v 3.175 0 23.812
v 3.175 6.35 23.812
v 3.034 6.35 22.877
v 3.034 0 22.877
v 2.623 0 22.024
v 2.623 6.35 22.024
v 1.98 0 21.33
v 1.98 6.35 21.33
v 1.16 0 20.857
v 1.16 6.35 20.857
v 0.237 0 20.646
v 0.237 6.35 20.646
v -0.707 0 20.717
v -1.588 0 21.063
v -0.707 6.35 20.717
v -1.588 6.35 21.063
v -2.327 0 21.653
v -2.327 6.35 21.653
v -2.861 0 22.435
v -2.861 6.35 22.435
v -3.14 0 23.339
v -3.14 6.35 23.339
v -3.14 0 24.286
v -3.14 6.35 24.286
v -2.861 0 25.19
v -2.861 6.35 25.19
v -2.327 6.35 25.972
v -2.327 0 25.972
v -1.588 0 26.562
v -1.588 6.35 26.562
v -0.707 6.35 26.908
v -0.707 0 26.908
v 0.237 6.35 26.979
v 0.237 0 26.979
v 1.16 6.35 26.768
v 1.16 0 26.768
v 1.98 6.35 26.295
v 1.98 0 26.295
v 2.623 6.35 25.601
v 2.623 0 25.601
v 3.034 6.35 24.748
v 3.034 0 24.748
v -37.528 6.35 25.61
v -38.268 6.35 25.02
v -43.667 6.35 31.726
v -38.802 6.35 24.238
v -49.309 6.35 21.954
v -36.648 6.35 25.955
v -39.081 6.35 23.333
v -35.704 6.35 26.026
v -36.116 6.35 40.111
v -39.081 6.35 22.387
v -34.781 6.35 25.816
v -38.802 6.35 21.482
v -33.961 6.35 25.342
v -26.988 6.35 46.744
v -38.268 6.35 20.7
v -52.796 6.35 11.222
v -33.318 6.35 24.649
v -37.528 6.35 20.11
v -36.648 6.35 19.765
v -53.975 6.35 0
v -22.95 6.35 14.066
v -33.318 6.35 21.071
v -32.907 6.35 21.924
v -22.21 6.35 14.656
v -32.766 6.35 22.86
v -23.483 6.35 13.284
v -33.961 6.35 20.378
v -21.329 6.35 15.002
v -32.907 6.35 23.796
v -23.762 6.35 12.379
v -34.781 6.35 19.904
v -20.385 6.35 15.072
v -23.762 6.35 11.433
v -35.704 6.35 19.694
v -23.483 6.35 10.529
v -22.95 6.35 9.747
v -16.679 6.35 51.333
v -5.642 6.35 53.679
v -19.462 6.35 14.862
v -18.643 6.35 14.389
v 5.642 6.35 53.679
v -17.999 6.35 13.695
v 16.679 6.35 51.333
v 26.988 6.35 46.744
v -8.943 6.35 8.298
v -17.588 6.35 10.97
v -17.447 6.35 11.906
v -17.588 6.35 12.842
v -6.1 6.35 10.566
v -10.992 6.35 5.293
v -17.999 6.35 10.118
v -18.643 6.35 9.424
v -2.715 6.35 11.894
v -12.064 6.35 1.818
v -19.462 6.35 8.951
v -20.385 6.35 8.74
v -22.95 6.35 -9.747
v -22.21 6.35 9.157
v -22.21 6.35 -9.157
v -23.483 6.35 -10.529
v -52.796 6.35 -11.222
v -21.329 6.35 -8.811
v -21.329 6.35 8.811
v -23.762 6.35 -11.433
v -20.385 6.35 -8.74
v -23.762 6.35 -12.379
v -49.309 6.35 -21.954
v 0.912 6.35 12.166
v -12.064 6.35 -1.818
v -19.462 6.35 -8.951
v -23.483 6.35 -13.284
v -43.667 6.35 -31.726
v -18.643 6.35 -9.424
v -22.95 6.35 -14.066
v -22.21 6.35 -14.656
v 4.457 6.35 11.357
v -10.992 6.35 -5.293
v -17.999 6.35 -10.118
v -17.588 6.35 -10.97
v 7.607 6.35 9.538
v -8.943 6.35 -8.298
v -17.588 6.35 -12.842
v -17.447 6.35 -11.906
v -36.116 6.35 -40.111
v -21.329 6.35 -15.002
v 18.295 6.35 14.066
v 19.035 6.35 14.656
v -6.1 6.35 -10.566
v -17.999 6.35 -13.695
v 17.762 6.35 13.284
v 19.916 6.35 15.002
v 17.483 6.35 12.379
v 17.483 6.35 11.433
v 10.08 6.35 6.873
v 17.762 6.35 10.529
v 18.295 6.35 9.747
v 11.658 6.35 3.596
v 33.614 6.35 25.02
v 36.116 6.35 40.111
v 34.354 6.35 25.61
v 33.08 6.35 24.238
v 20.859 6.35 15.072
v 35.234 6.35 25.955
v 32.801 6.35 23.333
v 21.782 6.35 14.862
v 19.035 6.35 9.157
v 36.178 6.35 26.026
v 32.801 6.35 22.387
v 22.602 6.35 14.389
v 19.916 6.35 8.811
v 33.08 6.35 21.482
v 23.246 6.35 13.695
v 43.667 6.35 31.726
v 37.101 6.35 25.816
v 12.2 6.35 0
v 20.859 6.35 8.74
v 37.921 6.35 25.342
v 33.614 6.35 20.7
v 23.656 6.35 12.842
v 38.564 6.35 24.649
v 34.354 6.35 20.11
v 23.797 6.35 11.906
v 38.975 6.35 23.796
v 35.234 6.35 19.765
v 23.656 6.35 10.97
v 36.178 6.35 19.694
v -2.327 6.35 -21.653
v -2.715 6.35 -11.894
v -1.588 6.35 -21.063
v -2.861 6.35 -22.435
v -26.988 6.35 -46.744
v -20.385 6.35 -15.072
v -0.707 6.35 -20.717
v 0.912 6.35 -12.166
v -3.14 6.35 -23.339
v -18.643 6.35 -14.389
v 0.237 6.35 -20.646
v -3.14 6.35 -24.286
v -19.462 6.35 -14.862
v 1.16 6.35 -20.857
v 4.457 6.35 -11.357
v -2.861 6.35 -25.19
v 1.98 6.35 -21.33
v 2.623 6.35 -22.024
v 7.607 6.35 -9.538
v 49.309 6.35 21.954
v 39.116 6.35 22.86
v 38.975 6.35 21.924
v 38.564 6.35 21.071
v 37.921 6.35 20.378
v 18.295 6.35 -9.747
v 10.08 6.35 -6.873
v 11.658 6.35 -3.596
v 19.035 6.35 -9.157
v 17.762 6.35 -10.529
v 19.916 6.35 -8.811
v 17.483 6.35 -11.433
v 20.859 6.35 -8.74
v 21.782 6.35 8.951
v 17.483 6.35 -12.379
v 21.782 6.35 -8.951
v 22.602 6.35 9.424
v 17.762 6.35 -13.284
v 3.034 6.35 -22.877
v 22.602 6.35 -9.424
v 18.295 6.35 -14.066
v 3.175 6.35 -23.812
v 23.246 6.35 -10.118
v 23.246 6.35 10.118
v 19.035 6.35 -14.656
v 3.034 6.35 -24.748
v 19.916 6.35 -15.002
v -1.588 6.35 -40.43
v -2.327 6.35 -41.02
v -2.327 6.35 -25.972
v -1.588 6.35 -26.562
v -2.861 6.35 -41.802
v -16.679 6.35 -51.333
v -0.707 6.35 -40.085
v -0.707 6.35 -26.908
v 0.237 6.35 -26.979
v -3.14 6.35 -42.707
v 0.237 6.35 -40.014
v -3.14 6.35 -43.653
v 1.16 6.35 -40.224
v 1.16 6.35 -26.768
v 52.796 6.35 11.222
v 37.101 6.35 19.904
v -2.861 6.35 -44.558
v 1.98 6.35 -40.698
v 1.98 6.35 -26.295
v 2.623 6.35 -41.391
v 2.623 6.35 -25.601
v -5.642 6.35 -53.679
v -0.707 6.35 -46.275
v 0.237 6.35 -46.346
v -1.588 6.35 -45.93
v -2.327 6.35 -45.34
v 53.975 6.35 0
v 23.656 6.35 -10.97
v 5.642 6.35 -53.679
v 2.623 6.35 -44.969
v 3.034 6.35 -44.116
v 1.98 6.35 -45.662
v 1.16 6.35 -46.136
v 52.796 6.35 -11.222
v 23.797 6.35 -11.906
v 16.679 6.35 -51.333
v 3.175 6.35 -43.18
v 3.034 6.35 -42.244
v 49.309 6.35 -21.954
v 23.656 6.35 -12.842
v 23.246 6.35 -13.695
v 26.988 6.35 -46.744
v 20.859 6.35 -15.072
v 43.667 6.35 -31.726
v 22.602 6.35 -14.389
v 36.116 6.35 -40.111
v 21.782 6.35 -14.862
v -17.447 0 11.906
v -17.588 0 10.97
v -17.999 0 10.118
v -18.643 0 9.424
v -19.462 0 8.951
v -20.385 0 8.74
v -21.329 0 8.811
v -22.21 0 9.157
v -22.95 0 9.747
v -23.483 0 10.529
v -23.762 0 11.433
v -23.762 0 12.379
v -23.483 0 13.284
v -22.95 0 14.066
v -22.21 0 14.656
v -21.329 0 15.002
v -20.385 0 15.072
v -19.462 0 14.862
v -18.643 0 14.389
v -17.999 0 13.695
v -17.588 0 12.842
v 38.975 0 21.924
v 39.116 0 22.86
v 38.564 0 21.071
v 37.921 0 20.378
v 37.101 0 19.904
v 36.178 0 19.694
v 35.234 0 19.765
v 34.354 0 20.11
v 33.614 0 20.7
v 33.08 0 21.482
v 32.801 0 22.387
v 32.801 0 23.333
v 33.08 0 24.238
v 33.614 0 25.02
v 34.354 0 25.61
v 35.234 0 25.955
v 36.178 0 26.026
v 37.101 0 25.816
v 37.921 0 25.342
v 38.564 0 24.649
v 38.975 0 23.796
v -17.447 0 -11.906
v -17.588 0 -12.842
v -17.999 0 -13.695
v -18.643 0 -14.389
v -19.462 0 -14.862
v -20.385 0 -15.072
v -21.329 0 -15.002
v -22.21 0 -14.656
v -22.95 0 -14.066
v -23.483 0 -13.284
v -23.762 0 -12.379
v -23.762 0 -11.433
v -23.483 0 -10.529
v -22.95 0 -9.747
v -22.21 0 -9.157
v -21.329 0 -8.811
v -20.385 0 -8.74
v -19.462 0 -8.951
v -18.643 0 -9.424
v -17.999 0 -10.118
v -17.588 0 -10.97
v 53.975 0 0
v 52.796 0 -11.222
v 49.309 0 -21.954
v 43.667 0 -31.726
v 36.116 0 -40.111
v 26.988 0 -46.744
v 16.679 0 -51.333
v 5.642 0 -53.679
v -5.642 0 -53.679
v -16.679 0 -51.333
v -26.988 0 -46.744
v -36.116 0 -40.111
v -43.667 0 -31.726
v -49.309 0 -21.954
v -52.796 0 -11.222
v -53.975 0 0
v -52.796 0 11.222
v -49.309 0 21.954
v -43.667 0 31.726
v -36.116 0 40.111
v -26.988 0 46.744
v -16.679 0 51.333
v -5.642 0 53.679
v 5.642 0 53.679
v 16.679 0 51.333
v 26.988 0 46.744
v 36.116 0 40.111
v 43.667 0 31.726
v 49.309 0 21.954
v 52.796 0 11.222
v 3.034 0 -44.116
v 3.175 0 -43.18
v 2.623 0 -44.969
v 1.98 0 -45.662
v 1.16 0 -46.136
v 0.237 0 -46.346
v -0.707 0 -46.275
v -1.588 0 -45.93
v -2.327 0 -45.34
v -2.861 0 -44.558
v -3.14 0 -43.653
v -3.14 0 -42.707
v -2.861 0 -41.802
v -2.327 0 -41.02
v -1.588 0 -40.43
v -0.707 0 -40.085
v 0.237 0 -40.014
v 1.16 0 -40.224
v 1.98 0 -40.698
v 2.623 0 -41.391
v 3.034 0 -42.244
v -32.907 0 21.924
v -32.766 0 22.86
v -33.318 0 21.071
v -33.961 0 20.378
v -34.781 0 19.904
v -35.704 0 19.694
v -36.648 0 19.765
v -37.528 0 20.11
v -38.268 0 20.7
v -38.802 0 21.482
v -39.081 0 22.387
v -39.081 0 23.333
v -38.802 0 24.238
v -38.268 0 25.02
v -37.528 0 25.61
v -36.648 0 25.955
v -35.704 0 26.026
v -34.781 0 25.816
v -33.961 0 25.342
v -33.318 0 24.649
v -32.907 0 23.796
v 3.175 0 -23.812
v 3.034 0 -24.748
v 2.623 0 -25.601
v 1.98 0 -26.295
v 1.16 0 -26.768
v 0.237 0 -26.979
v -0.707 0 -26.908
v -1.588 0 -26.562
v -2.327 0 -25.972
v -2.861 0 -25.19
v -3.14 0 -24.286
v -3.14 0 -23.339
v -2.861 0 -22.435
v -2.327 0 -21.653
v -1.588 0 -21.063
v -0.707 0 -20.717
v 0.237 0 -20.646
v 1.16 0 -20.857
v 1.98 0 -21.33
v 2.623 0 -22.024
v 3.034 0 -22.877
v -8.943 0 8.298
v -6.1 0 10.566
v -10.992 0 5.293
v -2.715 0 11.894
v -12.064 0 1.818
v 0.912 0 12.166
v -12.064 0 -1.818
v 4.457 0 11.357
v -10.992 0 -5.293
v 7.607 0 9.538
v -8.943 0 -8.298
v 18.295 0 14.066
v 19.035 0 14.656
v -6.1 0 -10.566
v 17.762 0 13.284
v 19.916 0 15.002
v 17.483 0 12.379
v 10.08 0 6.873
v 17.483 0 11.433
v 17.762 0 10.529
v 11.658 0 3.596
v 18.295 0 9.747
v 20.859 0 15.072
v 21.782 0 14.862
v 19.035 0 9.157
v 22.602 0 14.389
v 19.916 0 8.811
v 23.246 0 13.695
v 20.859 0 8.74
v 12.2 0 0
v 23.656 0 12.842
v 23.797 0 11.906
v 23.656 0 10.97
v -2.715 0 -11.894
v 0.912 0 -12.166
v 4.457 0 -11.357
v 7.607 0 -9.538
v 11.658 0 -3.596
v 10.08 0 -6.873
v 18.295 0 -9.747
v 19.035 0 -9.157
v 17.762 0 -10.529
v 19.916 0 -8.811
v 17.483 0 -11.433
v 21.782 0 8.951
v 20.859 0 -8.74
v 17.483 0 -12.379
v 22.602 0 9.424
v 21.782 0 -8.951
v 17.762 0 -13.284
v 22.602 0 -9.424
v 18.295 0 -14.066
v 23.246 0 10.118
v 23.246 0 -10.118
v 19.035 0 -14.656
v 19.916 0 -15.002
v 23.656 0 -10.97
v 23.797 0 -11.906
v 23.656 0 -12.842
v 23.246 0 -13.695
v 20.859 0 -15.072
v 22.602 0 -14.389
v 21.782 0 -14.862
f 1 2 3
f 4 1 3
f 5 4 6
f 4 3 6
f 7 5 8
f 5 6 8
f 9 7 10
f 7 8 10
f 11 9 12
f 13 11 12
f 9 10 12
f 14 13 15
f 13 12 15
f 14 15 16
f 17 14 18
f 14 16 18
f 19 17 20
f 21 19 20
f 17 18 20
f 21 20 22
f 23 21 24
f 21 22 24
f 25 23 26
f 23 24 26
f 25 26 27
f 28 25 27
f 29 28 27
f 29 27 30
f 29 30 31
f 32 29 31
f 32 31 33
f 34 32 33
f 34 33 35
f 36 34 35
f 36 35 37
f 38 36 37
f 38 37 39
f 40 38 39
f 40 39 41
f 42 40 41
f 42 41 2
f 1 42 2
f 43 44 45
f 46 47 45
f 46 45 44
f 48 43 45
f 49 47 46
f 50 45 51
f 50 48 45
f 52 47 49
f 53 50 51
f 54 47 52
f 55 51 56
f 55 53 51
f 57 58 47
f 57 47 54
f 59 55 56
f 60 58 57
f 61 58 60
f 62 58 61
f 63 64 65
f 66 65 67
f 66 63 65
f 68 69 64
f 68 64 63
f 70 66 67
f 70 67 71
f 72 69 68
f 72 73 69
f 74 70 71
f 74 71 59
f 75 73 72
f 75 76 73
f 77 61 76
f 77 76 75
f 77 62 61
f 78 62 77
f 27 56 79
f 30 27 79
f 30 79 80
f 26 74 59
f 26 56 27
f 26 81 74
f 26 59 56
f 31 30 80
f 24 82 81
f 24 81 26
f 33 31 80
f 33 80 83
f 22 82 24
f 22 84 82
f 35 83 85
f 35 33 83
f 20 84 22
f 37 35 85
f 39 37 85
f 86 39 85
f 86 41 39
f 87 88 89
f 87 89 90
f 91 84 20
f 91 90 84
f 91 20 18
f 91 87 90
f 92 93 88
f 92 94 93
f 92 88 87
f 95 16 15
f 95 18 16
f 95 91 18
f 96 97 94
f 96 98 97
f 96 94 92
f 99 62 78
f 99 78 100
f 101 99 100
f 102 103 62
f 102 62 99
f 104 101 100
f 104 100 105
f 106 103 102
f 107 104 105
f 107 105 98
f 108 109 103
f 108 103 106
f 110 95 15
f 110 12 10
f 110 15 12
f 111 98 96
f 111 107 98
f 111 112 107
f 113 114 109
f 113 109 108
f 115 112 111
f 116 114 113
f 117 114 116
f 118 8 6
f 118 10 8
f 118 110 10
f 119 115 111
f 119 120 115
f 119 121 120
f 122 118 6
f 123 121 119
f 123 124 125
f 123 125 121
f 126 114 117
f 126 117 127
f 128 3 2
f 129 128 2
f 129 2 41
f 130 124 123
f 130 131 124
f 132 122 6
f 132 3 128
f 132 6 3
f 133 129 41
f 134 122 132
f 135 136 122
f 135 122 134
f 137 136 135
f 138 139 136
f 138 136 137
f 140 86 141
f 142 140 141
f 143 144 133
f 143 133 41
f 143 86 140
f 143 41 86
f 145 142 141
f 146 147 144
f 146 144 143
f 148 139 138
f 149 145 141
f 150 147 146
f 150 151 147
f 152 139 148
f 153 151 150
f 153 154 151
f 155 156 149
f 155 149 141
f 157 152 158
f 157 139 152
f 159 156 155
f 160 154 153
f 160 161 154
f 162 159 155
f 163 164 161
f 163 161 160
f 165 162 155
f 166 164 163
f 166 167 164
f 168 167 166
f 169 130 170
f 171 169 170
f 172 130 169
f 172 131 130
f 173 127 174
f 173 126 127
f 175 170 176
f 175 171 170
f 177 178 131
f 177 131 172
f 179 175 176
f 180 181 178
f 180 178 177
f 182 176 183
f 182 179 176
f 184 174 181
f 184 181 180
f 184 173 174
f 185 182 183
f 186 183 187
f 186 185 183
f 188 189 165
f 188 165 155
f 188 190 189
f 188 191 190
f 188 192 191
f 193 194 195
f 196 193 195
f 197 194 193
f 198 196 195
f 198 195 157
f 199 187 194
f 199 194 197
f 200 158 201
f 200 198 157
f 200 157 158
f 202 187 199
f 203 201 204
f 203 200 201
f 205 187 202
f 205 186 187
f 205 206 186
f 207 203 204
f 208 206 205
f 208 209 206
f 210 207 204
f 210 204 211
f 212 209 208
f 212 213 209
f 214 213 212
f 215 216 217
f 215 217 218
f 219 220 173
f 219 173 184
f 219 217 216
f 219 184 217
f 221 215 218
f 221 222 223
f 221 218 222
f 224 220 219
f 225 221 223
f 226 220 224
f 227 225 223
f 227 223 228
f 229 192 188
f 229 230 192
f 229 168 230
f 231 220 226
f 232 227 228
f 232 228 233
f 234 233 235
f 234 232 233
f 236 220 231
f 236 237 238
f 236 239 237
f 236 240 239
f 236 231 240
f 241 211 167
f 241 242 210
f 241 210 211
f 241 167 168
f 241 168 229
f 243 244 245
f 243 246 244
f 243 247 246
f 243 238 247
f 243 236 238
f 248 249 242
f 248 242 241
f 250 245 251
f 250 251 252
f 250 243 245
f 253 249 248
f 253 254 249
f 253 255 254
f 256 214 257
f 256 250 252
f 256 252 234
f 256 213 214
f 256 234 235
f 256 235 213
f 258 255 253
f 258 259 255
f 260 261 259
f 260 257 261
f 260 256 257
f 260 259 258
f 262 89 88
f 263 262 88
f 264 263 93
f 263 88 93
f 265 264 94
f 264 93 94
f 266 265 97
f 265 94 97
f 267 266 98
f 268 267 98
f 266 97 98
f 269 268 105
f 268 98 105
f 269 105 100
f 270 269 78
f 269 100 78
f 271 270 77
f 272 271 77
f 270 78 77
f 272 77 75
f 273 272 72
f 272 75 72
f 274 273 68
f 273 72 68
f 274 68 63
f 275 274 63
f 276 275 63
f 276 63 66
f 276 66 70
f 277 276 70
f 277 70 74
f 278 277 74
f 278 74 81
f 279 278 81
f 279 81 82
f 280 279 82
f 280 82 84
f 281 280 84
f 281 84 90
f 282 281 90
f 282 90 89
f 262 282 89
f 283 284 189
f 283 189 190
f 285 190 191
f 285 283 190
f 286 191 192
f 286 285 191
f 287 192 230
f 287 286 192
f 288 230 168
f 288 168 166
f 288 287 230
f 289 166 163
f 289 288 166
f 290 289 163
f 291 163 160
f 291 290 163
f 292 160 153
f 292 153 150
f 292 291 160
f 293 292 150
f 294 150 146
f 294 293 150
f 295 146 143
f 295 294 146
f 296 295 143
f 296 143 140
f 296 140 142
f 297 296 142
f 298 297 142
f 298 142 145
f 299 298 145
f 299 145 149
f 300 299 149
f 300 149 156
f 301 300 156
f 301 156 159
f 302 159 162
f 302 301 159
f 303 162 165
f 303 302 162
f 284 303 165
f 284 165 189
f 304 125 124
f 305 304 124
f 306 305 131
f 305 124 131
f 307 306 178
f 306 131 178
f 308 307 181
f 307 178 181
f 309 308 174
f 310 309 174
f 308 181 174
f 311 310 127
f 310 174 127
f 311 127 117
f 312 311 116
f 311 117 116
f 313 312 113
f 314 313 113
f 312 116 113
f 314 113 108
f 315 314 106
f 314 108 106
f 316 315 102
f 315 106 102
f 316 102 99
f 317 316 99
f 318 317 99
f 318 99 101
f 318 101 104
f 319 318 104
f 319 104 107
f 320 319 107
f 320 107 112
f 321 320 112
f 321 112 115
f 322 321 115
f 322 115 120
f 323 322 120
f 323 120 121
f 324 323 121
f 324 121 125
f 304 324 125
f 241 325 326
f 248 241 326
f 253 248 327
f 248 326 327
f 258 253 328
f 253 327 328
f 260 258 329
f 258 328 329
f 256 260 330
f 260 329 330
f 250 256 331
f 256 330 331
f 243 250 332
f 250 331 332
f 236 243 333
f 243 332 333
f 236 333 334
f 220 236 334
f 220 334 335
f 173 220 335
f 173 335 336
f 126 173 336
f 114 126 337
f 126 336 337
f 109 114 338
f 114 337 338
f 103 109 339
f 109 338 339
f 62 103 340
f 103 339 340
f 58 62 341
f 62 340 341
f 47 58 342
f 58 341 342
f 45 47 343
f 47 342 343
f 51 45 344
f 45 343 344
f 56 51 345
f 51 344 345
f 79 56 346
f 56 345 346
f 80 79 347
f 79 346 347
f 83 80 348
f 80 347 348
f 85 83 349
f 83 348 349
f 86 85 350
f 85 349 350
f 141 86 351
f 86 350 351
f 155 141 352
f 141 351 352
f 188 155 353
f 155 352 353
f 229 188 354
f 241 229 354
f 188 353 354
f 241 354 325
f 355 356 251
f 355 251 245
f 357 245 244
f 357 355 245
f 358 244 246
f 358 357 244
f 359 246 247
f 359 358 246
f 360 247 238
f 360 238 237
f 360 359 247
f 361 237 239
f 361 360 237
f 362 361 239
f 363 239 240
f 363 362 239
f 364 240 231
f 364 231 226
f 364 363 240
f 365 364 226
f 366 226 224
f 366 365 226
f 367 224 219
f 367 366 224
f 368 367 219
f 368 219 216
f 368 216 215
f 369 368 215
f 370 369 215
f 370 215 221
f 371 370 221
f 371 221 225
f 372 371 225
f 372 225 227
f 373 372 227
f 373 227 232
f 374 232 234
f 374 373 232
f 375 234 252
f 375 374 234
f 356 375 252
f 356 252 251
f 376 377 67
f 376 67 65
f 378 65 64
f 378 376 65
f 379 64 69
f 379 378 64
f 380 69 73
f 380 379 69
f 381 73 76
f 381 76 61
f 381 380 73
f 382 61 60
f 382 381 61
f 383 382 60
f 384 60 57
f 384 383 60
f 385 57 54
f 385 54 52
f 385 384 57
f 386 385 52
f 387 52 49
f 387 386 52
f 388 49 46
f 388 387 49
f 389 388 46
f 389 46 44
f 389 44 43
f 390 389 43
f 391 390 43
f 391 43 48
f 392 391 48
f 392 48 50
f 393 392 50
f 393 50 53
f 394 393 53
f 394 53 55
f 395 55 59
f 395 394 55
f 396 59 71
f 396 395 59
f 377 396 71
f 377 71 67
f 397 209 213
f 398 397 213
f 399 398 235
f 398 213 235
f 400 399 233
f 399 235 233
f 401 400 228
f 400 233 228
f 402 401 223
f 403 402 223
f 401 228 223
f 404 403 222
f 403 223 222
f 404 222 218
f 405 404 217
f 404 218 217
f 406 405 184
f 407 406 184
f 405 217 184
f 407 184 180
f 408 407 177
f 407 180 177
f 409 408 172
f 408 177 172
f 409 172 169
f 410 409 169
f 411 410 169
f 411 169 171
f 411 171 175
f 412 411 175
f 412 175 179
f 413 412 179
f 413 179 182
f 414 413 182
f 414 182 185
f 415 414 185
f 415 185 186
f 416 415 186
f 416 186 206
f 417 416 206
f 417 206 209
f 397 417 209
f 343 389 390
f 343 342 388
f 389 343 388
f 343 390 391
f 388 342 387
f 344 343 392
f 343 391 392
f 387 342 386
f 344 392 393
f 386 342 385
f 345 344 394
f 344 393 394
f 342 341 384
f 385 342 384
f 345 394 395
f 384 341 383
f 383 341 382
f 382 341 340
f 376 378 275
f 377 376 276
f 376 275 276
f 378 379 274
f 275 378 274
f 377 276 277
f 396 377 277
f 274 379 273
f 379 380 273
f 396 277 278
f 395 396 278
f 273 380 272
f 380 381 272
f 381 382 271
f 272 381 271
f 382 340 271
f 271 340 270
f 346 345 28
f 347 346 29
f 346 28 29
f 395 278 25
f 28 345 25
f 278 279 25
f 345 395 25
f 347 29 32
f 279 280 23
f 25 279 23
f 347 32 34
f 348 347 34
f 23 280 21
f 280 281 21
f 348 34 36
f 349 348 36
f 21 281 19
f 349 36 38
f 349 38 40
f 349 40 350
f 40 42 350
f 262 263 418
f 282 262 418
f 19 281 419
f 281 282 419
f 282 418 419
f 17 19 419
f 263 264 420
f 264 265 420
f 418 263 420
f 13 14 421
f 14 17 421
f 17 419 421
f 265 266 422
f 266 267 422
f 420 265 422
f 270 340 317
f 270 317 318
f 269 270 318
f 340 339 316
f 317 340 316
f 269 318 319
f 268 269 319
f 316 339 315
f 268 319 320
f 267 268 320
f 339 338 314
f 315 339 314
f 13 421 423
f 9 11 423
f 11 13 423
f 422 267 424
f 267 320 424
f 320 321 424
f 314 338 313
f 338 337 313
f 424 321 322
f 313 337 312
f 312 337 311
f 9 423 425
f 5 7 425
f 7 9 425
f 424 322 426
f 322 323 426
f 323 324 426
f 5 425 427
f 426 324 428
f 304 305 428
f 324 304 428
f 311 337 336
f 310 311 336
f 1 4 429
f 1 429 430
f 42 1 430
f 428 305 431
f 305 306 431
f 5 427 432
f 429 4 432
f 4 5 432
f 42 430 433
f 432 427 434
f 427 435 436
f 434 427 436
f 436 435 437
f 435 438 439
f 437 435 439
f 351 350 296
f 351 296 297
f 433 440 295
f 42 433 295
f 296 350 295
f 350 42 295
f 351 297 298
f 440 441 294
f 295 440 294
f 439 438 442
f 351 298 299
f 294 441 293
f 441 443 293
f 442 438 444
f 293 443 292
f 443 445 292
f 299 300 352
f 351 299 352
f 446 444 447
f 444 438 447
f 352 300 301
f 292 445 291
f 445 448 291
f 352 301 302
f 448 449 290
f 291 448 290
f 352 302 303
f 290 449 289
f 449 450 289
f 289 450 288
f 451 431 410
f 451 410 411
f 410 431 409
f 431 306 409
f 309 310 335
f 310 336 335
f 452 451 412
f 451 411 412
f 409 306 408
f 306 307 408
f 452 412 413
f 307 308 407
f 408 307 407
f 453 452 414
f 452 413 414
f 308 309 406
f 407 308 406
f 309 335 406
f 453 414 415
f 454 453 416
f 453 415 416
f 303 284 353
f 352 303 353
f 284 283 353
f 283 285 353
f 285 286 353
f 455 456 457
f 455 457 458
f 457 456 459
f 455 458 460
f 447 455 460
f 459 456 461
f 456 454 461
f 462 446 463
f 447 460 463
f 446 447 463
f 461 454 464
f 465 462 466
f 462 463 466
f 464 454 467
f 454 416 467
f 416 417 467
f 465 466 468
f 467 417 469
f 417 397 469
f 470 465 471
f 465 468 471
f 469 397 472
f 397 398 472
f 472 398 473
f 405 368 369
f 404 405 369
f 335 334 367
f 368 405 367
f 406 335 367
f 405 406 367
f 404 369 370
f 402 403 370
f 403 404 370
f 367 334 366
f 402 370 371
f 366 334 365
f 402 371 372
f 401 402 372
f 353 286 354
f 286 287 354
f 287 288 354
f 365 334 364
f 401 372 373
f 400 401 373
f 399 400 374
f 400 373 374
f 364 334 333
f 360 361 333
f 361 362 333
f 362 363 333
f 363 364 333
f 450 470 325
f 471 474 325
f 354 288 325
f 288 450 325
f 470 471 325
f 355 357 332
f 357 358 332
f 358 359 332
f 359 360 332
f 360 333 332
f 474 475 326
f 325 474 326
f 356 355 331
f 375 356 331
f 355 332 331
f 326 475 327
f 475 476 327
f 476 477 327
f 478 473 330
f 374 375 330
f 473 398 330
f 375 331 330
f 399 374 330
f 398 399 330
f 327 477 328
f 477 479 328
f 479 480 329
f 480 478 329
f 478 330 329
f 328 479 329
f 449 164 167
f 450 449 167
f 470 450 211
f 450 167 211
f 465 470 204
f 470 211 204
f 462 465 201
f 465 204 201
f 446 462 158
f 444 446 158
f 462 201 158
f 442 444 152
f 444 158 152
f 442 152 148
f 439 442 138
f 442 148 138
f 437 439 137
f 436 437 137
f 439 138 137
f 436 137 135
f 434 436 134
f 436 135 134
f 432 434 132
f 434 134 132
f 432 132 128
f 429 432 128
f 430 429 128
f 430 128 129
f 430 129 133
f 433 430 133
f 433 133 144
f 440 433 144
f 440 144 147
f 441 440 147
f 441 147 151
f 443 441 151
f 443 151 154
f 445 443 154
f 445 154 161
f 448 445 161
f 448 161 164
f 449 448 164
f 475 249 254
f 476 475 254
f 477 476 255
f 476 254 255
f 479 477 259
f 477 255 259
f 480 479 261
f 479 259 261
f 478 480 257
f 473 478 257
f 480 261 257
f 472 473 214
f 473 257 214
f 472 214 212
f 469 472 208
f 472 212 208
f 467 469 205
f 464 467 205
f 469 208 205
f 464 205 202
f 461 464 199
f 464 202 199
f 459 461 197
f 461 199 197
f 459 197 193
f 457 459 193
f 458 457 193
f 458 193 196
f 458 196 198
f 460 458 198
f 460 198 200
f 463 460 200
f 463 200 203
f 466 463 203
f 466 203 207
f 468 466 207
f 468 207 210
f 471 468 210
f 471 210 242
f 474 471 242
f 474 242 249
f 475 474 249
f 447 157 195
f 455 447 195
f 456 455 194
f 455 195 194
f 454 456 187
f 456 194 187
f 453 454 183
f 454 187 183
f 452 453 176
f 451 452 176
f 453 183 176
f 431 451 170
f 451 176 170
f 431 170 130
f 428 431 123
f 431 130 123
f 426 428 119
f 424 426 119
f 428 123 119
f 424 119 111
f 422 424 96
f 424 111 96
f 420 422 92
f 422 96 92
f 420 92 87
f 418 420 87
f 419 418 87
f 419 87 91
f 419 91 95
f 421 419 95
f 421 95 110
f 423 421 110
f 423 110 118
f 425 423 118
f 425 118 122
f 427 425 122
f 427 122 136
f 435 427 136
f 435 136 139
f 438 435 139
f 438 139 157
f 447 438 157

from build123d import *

# Parameters (mm, degrees)
SKETCH1_R           = 53.975
SKETCH1_R_2         = 3.175
BOSS_EXTRUDE1_DEPTH = 6.35
SKETCH2_R           = 3.175
SKETCH2_R_2         = 12.2
CUT_EXTRUDE1_DEPTH  = 7.35


with BuildPart() as part:
    # Sketch1 → Boss-Extrude1 (new body)
    with BuildSketch(Plane(origin=(0, 0, 0), x_dir=(1, 0, 0), z_dir=(0, 1, 0))):
        Circle(SKETCH1_R)
        with Locations((0, 43.18)):
            Circle(SKETCH1_R_2, mode=Mode.SUBTRACT)
        with Locations((35.941, -22.86)):
            Circle(SKETCH1_R_2, mode=Mode.SUBTRACT)
        with Locations((-35.941, -22.86)):
            Circle(SKETCH1_R_2, mode=Mode.SUBTRACT)
    extrude(amount=BOSS_EXTRUDE1_DEPTH)

    # Sketch2 → Cut-Extrude1 (cut, through all)
    with BuildSketch(Plane(origin=(0, 6.35, 0), x_dir=(1, 0, 0), z_dir=(0, 1, 0))):
        with Locations((0, 23.8125)):
            Circle(SKETCH2_R)
        with Locations((20.622229928, 11.90625)):
            Circle(SKETCH2_R)
        with Locations((20.622229928, -11.90625)):
            Circle(SKETCH2_R)
        with Locations((0, -23.8125)):
            Circle(SKETCH2_R)
        with Locations((-20.622229928, -11.90625)):
            Circle(SKETCH2_R)
        with Locations((-20.622229928, 11.90625)):
            Circle(SKETCH2_R)
        Circle(SKETCH2_R_2)
    extrude(amount=-CUT_EXTRUDE1_DEPTH, mode=Mode.SUBTRACT)


solid = part.part
